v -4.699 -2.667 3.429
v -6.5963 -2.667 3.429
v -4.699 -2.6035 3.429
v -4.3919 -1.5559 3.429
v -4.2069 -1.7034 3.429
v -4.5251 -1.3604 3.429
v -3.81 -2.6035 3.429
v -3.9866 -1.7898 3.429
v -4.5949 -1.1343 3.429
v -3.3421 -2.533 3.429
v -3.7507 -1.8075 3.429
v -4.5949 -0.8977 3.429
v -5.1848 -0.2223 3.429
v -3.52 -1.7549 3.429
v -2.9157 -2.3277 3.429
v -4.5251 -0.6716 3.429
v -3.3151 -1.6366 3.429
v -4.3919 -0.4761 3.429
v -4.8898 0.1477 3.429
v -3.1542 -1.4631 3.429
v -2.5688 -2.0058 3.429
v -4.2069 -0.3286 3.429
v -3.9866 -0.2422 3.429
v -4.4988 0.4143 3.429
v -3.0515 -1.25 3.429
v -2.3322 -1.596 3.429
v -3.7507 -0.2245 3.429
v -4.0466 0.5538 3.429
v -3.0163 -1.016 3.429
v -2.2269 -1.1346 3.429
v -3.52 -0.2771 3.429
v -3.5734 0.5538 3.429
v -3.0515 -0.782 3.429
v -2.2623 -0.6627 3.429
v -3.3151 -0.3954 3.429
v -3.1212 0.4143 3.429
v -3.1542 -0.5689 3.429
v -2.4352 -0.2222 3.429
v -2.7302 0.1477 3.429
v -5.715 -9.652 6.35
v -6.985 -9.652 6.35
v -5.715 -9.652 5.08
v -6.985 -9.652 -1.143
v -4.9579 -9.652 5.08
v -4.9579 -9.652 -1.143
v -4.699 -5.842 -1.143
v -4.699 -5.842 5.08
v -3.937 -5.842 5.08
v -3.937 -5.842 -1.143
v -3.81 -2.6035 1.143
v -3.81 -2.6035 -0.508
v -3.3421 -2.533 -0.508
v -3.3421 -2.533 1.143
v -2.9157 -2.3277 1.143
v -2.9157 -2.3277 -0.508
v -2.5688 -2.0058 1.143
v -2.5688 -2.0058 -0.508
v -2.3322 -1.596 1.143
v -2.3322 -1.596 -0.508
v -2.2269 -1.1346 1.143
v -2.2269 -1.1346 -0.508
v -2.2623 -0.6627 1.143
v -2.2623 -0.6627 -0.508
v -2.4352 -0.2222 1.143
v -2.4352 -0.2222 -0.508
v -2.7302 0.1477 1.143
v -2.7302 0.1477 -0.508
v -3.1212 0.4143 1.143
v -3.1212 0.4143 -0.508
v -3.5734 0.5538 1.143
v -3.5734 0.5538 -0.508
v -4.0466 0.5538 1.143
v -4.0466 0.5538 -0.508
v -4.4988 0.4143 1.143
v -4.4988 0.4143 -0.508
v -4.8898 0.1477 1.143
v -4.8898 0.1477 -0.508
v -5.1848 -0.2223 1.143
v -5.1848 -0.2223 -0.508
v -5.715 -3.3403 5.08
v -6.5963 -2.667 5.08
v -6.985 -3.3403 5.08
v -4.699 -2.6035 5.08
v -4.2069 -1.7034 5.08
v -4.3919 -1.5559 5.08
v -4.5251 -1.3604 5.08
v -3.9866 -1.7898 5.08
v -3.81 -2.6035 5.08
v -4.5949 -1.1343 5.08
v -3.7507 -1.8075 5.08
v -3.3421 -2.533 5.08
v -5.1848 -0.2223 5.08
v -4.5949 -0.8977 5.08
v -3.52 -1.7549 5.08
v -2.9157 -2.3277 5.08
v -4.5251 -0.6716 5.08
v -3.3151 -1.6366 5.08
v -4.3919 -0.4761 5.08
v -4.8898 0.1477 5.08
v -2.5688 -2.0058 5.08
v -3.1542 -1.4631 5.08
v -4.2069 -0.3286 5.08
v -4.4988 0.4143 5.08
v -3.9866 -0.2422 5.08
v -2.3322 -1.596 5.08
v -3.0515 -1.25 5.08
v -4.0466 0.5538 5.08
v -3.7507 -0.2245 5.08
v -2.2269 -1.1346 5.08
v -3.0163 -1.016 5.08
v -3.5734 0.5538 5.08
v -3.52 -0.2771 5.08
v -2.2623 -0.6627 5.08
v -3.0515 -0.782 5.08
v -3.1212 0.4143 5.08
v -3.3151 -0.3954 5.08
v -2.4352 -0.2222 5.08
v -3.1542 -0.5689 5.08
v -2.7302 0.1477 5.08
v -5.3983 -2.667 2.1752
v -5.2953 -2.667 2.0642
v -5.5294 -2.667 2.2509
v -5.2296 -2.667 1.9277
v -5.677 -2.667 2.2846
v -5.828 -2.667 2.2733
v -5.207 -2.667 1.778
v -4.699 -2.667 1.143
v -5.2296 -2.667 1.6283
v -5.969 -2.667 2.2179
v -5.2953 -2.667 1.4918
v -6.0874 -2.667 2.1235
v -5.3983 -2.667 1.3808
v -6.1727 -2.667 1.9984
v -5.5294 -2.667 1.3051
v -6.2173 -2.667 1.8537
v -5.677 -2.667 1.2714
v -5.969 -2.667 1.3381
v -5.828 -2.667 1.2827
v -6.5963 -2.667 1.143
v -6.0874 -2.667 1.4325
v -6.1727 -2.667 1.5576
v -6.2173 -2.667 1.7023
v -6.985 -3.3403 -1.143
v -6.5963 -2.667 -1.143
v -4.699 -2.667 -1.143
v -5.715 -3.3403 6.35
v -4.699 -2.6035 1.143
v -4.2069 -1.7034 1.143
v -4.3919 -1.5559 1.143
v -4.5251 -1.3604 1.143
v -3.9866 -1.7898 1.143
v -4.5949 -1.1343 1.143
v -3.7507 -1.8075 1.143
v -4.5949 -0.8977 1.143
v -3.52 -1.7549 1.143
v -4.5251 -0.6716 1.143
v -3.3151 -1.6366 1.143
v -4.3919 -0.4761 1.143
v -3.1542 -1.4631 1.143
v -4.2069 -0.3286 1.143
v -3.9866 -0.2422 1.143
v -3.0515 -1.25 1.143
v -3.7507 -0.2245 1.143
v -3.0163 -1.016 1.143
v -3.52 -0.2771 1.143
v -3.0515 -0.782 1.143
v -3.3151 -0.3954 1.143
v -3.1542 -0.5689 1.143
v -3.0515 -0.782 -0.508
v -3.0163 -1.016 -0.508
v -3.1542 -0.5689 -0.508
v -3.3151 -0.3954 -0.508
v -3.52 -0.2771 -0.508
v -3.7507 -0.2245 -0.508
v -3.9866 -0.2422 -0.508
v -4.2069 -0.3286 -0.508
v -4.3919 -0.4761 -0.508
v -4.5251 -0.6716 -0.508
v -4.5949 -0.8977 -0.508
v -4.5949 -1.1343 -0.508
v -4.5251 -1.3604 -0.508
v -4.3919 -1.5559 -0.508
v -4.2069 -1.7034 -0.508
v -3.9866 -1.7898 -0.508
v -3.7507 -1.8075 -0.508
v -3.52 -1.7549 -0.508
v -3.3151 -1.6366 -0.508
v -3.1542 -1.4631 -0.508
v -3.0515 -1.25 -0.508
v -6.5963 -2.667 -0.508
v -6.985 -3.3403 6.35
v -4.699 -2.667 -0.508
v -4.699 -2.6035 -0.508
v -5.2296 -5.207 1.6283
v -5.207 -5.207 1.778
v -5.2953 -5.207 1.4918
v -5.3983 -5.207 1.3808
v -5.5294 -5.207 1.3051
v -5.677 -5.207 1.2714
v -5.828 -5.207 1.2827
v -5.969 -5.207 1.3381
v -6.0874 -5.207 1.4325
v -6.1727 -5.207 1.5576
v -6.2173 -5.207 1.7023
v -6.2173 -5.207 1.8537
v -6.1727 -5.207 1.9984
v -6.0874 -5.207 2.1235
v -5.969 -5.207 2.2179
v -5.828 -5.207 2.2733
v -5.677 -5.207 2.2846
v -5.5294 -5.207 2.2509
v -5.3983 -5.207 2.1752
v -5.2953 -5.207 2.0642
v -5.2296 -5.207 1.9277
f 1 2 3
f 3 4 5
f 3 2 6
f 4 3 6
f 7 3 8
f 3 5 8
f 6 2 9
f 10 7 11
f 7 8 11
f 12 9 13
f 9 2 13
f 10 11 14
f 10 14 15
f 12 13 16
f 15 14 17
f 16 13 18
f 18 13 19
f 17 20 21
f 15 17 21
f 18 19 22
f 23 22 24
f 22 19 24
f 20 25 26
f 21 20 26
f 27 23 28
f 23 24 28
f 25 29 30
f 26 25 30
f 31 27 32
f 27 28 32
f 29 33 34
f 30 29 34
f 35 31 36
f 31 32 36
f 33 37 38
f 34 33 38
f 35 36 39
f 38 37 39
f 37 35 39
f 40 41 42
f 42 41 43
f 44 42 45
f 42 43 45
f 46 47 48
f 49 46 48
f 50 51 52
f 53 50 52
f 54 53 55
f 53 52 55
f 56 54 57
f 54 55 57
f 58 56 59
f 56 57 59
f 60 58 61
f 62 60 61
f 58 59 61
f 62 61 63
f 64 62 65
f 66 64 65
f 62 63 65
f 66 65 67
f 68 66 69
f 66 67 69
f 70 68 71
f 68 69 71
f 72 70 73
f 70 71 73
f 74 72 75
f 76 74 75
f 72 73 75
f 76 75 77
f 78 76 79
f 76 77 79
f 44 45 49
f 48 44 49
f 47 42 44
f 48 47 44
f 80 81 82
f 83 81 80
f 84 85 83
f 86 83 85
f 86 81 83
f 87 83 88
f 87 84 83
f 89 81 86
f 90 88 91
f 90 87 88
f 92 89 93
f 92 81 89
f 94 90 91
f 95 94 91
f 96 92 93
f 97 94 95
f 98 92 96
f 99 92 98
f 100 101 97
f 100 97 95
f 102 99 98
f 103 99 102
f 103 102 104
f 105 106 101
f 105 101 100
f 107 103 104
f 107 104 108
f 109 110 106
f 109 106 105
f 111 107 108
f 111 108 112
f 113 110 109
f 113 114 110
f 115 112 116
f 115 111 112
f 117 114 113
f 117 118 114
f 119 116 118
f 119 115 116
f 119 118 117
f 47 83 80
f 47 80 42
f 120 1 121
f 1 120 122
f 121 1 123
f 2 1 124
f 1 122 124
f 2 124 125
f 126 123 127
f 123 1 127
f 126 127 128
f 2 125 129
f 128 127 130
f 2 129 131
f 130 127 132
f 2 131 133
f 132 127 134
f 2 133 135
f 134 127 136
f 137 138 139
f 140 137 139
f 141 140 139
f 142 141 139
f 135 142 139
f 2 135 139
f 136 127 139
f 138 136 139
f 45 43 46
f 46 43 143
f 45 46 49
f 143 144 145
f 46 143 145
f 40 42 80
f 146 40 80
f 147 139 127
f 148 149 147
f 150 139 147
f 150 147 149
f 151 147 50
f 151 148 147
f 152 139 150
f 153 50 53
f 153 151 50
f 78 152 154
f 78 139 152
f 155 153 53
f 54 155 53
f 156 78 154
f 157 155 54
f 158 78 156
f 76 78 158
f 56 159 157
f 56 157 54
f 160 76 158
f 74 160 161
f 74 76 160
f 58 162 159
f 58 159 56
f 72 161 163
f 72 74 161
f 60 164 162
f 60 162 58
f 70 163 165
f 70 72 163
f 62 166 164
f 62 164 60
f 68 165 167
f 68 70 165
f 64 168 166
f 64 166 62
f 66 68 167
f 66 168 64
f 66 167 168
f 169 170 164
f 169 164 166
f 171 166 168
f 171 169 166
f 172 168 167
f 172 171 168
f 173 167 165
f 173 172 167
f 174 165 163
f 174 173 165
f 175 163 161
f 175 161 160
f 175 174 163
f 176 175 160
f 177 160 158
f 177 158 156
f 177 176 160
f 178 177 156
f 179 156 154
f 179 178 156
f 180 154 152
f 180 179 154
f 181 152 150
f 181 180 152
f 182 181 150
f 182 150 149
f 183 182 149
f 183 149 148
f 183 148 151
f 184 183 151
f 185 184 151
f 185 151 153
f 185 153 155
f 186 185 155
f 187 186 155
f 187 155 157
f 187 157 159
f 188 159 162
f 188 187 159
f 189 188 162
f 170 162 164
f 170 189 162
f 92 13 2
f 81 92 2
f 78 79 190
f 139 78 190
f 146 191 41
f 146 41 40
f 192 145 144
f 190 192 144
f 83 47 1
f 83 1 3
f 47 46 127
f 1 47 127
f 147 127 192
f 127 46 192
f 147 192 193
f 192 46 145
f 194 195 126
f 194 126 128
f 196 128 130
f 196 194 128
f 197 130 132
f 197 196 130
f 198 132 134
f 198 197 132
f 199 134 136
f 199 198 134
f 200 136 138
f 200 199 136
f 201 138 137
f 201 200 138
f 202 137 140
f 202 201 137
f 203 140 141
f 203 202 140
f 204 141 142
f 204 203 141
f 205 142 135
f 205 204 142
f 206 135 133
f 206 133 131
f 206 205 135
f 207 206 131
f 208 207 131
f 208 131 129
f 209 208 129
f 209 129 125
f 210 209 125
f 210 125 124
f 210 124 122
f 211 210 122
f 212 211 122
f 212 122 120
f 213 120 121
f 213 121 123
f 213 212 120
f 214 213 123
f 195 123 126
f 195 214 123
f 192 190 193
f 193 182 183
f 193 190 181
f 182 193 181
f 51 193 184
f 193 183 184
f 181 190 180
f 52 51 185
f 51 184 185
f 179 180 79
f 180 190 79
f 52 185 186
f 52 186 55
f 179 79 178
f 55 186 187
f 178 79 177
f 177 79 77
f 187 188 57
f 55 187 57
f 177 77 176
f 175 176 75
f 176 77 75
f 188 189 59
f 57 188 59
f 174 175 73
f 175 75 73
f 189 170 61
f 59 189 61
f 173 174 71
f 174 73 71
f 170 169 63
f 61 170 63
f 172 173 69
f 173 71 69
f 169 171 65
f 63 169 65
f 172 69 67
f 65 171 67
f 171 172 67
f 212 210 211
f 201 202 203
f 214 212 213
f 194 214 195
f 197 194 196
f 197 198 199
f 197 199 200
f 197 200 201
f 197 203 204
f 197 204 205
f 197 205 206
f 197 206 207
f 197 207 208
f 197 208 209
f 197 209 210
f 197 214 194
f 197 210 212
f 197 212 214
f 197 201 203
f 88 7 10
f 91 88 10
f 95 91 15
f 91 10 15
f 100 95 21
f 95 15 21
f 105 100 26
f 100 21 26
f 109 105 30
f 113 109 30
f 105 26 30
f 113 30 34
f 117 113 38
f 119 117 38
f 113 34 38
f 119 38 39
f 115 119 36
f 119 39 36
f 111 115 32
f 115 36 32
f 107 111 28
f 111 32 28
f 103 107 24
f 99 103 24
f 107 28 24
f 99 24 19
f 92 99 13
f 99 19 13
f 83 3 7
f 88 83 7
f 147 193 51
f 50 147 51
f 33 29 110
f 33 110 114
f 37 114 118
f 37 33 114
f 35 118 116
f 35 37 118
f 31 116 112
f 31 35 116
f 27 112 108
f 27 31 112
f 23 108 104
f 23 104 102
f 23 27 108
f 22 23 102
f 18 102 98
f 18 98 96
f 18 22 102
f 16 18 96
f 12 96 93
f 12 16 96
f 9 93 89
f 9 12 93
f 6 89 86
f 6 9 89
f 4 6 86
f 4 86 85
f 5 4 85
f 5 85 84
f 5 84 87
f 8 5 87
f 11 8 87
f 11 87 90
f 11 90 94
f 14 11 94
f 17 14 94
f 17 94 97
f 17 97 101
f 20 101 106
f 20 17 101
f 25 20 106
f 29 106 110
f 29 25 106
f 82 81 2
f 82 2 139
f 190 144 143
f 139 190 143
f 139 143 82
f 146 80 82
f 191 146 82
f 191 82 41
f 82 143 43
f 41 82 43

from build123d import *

# Parameters (mm, degrees)
OUTER_START                              = 2.286
OUTER_CLAMP_LATCH_CUT_EXTRUDE5_DEPTH     = 2.794
OUTER_START_2                            = -1.143
OUTER_CLAMP_LATCH_CUT_EXTRUDE5_2_DEPTH   = 2.4129999
OUTER_START_3                            = -0.508
OUTER_CLAMP_LATCH_CUT_EXTRUDE5_3_OUTLI_R = 0.79375
OUTER_CLAMP_LATCH_CUT_EXTRUDE5_3_DEPTH   = 1.651
OUTER_START_4                            = 3.429
OUTER_CLAMP_LATCH_CUT_EXTRUDE5_4_OUTLI_R = 0.79375
OUTER_CLAMP_LATCH_CUT_EXTRUDE5_4_DEPTH   = 1.651
OUTER_START_5                            = 5.08
OUTER_CLAMP_LATCH_CUT_EXTRUDE5_5_DEPTH   = 1.27
OUTER_START_6                            = 1.2699999
OUTER_CLAMP_LATCH_CUT_EXTRUDE5_6_DEPTH   = 1.0160001
OUTER_START_7                            = -5.207
OUTER_CLAMP_LATCH_CUT_EXTRUDE5_7_OUTLI_R = 0.508
OUTER_CLAMP_LATCH_CUT_EXTRUDE5_7_DEPTH   = 2.54
SKETCH1_W                                = 0.762
SKETCH1_H                                = 1.524
CUT_EXTRUDE1_DEPTH                       = 14.441616644


with BuildPart() as part:
    # <Outer Clamp Latch>-<Cut-Extrude5>: read off the stored shape, not the designer's step
    # <Outer Clamp Latch>-<Cut-Extrude5> outline → <Outer Clamp Latch>-<Cut-Extrude5> (new body)
    with BuildSketch(Plane.XY.offset(OUTER_START)):
        Polygon((-4.699, -4.318), (-4.699, -2.667), (-6.596292399, -2.667), (-6.985, -3.340261314), (-6.985, -9.652), (-4.957886423, -9.652), (-3.937, -5.842), (-3.937, -4.318), align=None)
    extrude(amount=OUTER_CLAMP_LATCH_CUT_EXTRUDE5_DEPTH)

    # Outer Clamp Latch_-_Cut-Extrude5 4 outli → Outer Clamp Latch_-_Cut-Extrude5 4 (add)
    with BuildSketch(Plane.XY.offset(OUTER_START_4)):
        with BuildLine():
            Line((-4.699, -2.667), (-4.699, -2.6035))
            Line((-4.699, -2.6035), (-3.81, -2.6035))
            ThreePointArc((-3.81, -2.6035), (-2.435184671, -0.222249999), (-5.184815329, -0.22225))
            Line((-5.184815329, -0.22225), (-6.596292399, -2.667))
            Line((-6.596292399, -2.667), (-4.699, -2.667))
        make_face()
        with Locations((-3.81, -1.016)):
            Circle(OUTER_CLAMP_LATCH_CUT_EXTRUDE5_4_OUTLI_R, mode=Mode.SUBTRACT)
    extrude(amount=OUTER_CLAMP_LATCH_CUT_EXTRUDE5_4_DEPTH)

    # Outer Clamp Latch_-_Cut-Extrude5 5 outli → Outer Clamp Latch_-_Cut-Extrude5 5 (add)
    with BuildSketch(Plane.XY.offset(OUTER_START_5)):
        Polygon((-5.715, -3.340261314), (-6.985, -3.340261314), (-6.985, -9.652), (-5.715, -9.652), (-5.715, -5.207), align=None)
    extrude(amount=OUTER_CLAMP_LATCH_CUT_EXTRUDE5_5_DEPTH)



with BuildPart() as body_2:
    # Outer Clamp Latch_-_Cut-Extrude5 2 outli → Outer Clamp Latch_-_Cut-Extrude5 2 (new body)
    with BuildSketch(Plane.XY.offset(OUTER_START_2)):
        Polygon((-4.699, -4.318), (-4.699, -2.667), (-6.596292399, -2.667), (-6.985, -3.340261314), (-6.985, -9.652), (-4.957886423, -9.652), (-3.937, -5.842), (-3.937, -4.318), align=None)
    extrude(amount=OUTER_CLAMP_LATCH_CUT_EXTRUDE5_2_DEPTH)

    # Outer Clamp Latch_-_Cut-Extrude5 3 outli → Outer Clamp Latch_-_Cut-Extrude5 3 (add)
    with BuildSketch(Plane.XY.offset(OUTER_START_3)):
        with BuildLine():
            Line((-4.699, -2.667), (-4.699, -2.6035))
            Line((-4.699, -2.6035), (-3.81, -2.6035))
            ThreePointArc((-3.81, -2.6035), (-2.435184671, -0.222249999), (-5.184815329, -0.22225))
            Line((-5.184815329, -0.22225), (-6.596292399, -2.667))
            Line((-6.596292399, -2.667), (-4.699, -2.667))
        make_face()
        with Locations((-3.81, -1.016)):
            Circle(OUTER_CLAMP_LATCH_CUT_EXTRUDE5_3_OUTLI_R, mode=Mode.SUBTRACT)
    extrude(amount=OUTER_CLAMP_LATCH_CUT_EXTRUDE5_3_DEPTH)


with BuildPart() as part_1:
    add(part.part)

    add(body_2.part)  # Outer Clamp Latch_-_Cut-Extrude5 6 merges body 2
    # Outer Clamp Latch_-_Cut-Extrude5 6 outli → Outer Clamp Latch_-_Cut-Extrude5 6 (add)
    with BuildSketch(Plane.XY.offset(OUTER_START_6)):
        Polygon((-4.699, -4.318), (-4.699, -2.667), (-6.596292399, -2.667), (-6.985, -3.340261314), (-6.985, -9.652), (-4.957886423, -9.652), (-3.937, -5.842), (-3.937, -4.318), align=None)
    extrude(amount=OUTER_CLAMP_LATCH_CUT_EXTRUDE5_6_DEPTH)

    # Outer Clamp Latch_-_Cut-Extrude5 7 outli → Outer Clamp Latch_-_Cut-Extrude5 7 (cut)
    with BuildSketch(Plane(origin=(0, 0, 0), x_dir=(1, 0, 0), z_dir=(0, 1, 0)).offset(OUTER_START_7)):
        with Locations((-5.715, -1.778)):
            Circle(OUTER_CLAMP_LATCH_CUT_EXTRUDE5_7_OUTLI_R)
    extrude(amount=OUTER_CLAMP_LATCH_CUT_EXTRUDE5_7_DEPTH, mode=Mode.SUBTRACT)

    # Sketch1 → Cut-Extrude1 (cut, through all)
    with BuildSketch(Plane.XY.offset(5.08)):
        with Locations((-4.318, -5.08)):
            Rectangle(SKETCH1_W, SKETCH1_H)
    extrude(amount=-CUT_EXTRUDE1_DEPTH, mode=Mode.SUBTRACT)


solid = part_1.part
